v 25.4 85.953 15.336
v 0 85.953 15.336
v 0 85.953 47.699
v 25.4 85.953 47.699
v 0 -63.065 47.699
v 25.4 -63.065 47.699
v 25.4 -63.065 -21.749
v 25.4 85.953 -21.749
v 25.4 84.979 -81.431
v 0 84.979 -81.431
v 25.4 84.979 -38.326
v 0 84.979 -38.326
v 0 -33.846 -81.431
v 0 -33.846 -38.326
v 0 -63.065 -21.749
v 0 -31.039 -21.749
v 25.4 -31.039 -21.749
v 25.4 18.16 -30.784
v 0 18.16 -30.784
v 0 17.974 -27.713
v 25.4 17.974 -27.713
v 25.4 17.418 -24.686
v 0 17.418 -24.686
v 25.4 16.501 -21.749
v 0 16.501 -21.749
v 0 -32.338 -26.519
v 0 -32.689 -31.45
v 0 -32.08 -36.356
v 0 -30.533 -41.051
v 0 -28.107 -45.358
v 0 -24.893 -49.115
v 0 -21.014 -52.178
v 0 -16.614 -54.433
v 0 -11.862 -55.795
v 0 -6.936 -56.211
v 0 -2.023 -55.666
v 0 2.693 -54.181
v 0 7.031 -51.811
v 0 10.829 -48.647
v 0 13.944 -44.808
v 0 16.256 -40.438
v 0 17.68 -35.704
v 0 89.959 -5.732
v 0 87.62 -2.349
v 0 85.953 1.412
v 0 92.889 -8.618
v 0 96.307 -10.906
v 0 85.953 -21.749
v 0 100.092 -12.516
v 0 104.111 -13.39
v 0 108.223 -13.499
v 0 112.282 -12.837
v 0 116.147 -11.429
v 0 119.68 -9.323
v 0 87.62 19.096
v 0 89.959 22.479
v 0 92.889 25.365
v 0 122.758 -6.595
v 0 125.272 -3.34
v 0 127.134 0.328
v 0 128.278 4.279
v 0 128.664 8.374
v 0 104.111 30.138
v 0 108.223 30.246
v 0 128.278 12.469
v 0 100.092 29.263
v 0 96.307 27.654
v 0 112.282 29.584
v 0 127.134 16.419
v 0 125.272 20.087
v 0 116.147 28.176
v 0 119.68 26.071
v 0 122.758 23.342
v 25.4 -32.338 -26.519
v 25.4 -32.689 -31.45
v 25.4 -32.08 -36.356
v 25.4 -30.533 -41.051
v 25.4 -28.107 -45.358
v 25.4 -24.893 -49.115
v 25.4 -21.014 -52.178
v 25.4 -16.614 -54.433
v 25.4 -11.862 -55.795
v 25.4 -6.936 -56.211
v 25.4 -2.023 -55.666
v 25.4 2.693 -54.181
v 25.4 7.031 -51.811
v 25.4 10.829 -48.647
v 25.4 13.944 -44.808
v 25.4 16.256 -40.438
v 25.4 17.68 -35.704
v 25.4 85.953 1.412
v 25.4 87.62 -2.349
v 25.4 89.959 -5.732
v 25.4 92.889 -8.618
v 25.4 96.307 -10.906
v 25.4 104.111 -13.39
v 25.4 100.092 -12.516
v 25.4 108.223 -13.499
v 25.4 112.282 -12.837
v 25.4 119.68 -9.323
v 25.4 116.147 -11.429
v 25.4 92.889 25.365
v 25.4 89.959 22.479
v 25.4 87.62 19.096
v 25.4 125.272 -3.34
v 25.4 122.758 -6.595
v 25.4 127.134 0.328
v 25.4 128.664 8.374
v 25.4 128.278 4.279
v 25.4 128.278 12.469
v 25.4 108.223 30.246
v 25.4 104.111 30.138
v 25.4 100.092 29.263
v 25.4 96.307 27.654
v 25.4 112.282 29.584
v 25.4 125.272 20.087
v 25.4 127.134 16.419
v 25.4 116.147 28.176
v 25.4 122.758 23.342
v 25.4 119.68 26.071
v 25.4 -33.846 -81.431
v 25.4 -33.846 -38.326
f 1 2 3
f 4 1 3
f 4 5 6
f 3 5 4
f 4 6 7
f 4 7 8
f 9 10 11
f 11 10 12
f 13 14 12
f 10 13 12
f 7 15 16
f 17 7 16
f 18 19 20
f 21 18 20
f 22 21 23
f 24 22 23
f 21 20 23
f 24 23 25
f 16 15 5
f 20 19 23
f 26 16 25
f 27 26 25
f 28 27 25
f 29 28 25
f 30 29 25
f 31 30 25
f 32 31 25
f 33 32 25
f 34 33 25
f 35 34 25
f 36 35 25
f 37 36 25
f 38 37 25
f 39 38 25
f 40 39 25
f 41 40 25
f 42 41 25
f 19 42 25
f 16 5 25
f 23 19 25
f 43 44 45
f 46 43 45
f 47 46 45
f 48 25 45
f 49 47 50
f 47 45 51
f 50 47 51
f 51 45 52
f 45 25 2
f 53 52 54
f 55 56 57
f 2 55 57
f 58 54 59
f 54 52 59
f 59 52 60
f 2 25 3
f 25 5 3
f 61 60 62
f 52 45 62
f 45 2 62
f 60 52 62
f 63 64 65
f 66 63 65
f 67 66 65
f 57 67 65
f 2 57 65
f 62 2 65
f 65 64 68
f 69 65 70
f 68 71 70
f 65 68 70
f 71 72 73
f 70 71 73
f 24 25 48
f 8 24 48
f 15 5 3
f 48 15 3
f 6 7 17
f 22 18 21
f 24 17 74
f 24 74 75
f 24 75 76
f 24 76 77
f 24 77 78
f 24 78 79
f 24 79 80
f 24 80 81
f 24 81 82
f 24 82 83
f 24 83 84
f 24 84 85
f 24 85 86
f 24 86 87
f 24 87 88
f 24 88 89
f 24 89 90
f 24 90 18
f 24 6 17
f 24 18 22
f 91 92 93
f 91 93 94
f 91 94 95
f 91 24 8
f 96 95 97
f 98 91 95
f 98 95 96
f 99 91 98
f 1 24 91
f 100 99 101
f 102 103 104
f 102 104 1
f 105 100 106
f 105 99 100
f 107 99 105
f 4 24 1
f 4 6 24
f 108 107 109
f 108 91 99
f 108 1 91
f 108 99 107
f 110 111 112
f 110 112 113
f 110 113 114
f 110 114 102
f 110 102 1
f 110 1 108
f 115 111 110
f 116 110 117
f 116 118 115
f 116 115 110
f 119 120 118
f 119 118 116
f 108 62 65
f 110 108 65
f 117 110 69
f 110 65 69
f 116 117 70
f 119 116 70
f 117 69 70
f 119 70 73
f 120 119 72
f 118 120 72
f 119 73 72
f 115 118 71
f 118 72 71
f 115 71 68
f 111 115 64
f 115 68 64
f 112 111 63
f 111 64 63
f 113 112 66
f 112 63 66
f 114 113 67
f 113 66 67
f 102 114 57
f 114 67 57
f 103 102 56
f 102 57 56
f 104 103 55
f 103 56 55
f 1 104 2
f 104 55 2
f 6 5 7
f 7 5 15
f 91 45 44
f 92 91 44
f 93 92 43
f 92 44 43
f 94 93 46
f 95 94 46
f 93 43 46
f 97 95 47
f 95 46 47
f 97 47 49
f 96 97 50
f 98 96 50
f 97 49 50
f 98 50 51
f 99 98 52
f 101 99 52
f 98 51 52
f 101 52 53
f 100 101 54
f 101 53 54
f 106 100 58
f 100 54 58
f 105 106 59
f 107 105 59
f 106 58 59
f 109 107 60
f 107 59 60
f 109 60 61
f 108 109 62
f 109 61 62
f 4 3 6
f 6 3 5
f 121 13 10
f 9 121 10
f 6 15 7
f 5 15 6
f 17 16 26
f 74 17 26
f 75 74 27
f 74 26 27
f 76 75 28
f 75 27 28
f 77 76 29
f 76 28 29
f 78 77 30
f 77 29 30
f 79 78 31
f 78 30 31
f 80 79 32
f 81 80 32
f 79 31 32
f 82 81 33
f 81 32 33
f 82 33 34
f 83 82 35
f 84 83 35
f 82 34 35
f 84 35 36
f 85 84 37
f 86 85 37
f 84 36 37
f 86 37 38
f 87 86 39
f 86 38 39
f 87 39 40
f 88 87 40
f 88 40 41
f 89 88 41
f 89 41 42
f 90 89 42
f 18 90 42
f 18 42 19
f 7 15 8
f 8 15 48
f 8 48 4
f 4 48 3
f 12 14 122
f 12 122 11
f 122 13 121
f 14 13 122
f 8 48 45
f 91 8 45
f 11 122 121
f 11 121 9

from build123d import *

# Parameters (mm, degrees)
F2_DEPTH = 25.4
F0_W     = 149.0184441209
F0_H     = 69.4482903928
F0_W_2   = 118.8251674175
F0_H_2   = 43.1051254272


with BuildPart() as f2:
    # F1 (on face) → F2 (new body)
    with BuildSketch(Plane.YZ):
        with BuildLine():
            ThreePointArc((85.9534442425, 1.4117961428), (110.267993631, -13.2632626913), (128.6636017991, 8.3736563101))
            ThreePointArc((128.6636017991, 8.3736563101), (110.267993631, 30.0105753116), (85.9534442425, 15.3355164775))
            Line((85.9534442425, 15.3355164775), (85.9534442425, 1.4117961428))
        make_face()
        with BuildLine():
            ThreePointArc((18.160164574, -30.7839829475), (17.7419169601, -26.1909085431), (16.5009324926, -21.7489246279))
            Line((16.5009324926, -21.7489246279), (-31.0386664721, -21.7489246279))
            ThreePointArc((-31.0386664721, -21.7489246279), (-11.8619413942, -55.7947668973), (18.160164574, -30.7839829475))
        make_face()
        with BuildLine():
            Line((85.9534442425, 1.4117961428), (85.9534442425, 15.3355164775))
            ThreePointArc((85.9534442425, 15.3355164775), (84.8186440038, 8.3736563101), (85.9534442425, 1.4117961428))
        make_face()
        with BuildLine():
            Line((-31.0386664721, -21.7489246279), (16.5009324926, -21.7489246279))
            ThreePointArc((16.5009324926, -21.7489246279), (-7.2688669898, -5.3549513837), (-31.0386664721, -21.7489246279))
        make_face()
        with BuildLine():
            ThreePointArc((85.9534442425, 1.4117961428), (84.8186440038, 8.3736563101), (85.9534442425, 15.3355164775))
            Line((85.9534442425, 15.3355164775), (85.9534442425, 47.6993657649))
            Line((85.9534442425, 47.6993657649), (-63.0649998784, 47.6993657649))
            Line((-63.0649998784, 47.6993657649), (-63.0649998784, -21.7489246279))
            Line((-63.0649998784, -21.7489246279), (-31.0386664721, -21.7489246279))
            ThreePointArc((-31.0386664721, -21.7489246279), (-7.2688669898, -5.3549513837), (16.5009324926, -21.7489246279))
            Line((16.5009324926, -21.7489246279), (85.9534442425, -21.7489246279))
            Line((85.9534442425, -21.7489246279), (85.9534442425, 1.4117961428))
        make_face()
    extrude(amount=F2_DEPTH)


with BuildPart() as f2b:
    # F0 (on Right) → F2, piece 2 (new body)
    with BuildSketch(Plane.YZ):
        with Locations((11.444222182, 12.9752205685)):
            Rectangle(F0_W, F0_H)
    extrude(amount=F2_DEPTH)


with BuildPart() as f2c:
    # F0 (on Right) → F2, piece 3 (new body)
    with BuildSketch(Plane.YZ):
        with Locations((25.5668833852, -59.8782151937)):
            Rectangle(F0_W_2, F0_H_2)
    extrude(amount=F2_DEPTH)


solid = Compound([f2.part, f2b.part, f2c.part])
